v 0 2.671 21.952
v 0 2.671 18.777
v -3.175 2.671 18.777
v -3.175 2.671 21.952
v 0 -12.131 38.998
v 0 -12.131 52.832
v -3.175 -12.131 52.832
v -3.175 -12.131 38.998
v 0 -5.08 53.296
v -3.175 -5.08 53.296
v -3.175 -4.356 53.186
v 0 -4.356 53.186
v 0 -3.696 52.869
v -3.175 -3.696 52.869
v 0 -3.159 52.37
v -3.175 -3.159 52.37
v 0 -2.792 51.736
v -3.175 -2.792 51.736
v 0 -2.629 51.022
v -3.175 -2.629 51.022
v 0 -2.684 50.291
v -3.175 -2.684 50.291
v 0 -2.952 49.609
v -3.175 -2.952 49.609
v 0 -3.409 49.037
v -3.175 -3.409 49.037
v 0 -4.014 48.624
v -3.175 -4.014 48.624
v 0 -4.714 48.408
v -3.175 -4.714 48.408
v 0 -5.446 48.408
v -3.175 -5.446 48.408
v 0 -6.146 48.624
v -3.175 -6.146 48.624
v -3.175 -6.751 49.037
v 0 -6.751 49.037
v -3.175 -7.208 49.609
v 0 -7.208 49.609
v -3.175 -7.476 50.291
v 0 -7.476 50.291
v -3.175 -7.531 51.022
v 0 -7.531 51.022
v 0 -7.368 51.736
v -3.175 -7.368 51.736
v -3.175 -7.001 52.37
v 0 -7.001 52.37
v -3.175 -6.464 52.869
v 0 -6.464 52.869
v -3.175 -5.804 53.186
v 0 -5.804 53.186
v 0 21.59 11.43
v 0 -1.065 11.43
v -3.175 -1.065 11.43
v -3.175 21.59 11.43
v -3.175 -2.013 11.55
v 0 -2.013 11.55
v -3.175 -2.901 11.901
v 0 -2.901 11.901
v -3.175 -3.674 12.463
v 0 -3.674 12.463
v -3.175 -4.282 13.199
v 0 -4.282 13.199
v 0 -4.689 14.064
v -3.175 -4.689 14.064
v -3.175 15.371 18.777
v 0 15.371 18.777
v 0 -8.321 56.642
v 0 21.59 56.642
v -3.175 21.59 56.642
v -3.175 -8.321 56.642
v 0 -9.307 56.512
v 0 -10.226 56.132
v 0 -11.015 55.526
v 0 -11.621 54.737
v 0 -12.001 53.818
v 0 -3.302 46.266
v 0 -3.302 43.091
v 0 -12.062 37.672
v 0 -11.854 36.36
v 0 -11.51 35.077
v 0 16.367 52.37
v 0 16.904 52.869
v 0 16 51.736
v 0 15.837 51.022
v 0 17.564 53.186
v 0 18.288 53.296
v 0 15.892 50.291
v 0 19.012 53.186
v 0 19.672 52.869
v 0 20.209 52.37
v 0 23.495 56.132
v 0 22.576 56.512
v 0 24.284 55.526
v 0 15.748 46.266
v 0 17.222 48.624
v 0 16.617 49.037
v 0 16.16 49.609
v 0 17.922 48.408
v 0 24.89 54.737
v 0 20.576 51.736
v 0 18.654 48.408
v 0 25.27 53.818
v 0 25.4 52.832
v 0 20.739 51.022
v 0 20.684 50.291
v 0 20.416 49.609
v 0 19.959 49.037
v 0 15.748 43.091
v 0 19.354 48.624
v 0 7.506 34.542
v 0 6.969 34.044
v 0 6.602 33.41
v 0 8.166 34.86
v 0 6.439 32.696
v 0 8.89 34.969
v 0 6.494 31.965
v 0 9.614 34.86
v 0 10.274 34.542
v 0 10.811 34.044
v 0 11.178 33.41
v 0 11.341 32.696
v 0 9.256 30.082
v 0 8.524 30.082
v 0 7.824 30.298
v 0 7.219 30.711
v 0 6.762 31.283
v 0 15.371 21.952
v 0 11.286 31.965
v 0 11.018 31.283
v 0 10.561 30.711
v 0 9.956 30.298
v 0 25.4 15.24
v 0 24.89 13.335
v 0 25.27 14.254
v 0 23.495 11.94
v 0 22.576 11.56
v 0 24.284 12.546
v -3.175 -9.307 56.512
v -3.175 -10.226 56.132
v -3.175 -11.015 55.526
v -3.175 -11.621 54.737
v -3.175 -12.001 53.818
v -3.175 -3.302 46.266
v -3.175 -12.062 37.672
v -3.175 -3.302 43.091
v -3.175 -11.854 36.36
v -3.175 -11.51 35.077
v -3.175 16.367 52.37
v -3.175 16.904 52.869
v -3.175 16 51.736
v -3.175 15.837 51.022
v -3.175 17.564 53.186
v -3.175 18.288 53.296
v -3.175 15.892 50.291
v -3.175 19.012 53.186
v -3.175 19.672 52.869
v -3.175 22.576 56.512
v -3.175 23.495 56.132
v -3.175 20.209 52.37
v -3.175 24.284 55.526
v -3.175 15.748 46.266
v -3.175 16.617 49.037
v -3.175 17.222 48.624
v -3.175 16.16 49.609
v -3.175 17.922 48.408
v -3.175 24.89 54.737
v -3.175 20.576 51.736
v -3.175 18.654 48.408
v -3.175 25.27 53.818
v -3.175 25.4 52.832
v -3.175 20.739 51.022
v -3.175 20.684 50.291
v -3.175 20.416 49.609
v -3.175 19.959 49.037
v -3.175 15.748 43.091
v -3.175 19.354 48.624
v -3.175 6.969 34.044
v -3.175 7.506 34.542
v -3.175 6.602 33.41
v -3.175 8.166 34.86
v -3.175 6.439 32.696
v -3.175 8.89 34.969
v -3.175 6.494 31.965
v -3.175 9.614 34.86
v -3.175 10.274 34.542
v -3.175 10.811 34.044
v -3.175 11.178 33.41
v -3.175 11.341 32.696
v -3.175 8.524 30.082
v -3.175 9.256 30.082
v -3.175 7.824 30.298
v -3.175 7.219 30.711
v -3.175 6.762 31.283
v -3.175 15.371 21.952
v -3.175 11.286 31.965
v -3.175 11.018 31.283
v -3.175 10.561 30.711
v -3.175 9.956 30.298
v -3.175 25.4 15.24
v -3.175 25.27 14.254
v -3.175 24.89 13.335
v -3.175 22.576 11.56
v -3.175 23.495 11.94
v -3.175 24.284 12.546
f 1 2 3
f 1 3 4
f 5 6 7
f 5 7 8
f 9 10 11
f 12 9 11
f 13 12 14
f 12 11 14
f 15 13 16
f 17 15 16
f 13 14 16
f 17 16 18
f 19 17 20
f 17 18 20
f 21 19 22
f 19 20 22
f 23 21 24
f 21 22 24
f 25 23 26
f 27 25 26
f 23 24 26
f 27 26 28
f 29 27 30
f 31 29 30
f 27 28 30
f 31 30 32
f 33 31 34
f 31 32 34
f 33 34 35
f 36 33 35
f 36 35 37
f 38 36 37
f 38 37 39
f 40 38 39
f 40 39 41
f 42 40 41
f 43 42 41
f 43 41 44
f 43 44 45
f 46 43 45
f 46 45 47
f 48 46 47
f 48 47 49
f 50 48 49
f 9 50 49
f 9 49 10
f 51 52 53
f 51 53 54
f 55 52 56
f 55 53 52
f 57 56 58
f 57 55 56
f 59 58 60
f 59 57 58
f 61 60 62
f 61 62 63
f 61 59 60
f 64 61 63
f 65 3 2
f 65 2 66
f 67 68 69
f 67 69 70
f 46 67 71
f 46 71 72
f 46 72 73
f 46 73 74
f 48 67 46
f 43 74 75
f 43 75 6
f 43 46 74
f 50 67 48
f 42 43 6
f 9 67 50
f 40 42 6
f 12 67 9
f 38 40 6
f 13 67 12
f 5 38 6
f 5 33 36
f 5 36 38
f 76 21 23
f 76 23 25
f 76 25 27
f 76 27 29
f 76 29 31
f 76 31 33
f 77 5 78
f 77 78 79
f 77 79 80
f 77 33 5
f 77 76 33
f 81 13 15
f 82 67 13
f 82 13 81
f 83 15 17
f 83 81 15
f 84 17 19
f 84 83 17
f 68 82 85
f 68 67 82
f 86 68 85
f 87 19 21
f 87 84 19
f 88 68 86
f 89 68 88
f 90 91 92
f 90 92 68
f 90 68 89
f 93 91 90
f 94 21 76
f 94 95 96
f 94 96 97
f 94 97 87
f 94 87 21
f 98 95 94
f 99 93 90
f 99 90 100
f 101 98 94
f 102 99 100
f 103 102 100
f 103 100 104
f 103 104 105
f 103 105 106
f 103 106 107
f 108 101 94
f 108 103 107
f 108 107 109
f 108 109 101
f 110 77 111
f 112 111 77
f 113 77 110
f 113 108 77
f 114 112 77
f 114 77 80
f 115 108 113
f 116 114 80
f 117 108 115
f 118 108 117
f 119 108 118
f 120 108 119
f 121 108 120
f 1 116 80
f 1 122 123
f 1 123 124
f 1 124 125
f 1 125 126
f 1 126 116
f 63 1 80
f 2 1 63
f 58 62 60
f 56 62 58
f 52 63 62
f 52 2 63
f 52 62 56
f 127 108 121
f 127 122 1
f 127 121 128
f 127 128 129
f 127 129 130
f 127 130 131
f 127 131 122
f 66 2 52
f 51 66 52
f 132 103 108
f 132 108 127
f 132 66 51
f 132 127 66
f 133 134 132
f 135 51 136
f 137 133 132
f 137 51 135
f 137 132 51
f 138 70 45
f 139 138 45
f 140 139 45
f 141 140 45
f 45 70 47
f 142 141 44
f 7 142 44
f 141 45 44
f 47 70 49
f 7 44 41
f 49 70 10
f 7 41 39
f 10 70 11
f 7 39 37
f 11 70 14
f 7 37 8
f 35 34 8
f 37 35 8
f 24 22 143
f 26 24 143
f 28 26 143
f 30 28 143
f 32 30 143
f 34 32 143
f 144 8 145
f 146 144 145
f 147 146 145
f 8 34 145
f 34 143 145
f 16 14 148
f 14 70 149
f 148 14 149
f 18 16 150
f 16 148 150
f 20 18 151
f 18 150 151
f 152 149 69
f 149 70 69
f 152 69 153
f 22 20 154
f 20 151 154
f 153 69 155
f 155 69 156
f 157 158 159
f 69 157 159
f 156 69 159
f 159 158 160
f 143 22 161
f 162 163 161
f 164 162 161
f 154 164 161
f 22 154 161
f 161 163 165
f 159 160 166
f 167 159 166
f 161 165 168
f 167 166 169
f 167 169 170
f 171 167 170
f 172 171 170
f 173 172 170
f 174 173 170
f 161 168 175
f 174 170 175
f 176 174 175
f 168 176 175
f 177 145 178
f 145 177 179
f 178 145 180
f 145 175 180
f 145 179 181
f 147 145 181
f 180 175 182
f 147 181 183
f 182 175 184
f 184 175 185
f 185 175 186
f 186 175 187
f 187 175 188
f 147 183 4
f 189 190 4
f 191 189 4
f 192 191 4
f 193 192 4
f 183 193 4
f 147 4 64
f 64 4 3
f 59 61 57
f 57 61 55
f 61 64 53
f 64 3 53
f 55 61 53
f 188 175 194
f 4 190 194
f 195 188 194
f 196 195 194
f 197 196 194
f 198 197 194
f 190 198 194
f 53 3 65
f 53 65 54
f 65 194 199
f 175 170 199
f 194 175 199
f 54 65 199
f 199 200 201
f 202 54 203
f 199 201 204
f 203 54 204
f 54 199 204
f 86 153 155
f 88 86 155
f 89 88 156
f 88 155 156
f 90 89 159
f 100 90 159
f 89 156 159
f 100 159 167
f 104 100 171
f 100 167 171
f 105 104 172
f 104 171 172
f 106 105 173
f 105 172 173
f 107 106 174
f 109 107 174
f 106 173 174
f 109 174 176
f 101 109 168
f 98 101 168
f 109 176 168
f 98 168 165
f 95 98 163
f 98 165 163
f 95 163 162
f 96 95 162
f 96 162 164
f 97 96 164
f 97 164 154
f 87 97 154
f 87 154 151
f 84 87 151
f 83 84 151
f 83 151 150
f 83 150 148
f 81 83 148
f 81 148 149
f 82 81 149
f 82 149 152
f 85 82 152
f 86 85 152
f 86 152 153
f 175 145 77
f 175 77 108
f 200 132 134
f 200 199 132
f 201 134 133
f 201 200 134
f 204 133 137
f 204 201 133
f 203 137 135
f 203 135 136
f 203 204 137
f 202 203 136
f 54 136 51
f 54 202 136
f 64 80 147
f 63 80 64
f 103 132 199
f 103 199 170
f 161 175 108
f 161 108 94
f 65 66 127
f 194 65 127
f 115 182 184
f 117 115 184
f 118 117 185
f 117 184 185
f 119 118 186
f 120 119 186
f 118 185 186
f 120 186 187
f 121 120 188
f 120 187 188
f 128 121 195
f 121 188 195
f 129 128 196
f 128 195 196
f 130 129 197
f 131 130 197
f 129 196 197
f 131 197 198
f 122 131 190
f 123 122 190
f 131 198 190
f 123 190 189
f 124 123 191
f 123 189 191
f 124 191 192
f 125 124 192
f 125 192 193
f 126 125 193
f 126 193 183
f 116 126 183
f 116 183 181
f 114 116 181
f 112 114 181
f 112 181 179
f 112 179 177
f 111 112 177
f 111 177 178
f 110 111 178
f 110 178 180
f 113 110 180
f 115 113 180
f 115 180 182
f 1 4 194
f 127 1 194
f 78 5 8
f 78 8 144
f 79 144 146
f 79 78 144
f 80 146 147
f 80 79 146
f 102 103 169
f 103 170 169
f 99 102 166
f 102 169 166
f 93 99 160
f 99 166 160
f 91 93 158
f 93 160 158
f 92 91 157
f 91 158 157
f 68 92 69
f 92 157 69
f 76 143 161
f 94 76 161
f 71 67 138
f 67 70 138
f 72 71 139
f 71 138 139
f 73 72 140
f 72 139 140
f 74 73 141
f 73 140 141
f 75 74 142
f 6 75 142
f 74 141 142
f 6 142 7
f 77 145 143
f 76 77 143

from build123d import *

# Parameters (mm, degrees)
BOSS_EXTRUDE1_DEPTH              = 3.175
F_10_0_1935_DIAMETER_HOLE1_D     = 4.9149
F_10_0_1935_DIAMETER_HOLE1_DEPTH = 11.176
F_10_0_1935_DIAMETER_HOLE1_TIP   = 1.476584928
SKETCH6_W                        = 3.175
SKETCH6_H                        = 19.05
SKETCH6_H_2                      = 12.7
CUT_EXTRUDE1_DEPTH               = 63.157515949
FILLET1_R                        = 3.81


with BuildPart() as part:
    # Sketch1 → Boss-Extrude1 (new body)
    with BuildSketch(Plane(origin=(0, 0, 0), x_dir=(0, 0, -1), z_dir=(1, 0, 0))):
        with BuildLine():
            Line((-11.43, 25.4), (-56.642, 25.4))
            Line((-56.642, 25.4), (-56.642, -12.13104))
            Line((-56.642, -12.13104), (-39.203469383, -12.13104))
            Line((-39.203469383, -12.13104), (-38.998073701, -12.13104))
            ThreePointArc((-38.998073701, -12.13104), (-37.012948259, -11.974934012), (-35.076624386, -11.510453697))
            Line((-35.076624386, -11.510453697), (-11.43, -3.833836163))
            Line((-11.43, -3.833836163), (-11.43, 25.4))
        make_face()
    extrude(amount=-BOSS_EXTRUDE1_DEPTH)

    # #10 (0.1935) Diameter Hole1
    with Locations(Plane(origin=(0, 0, 0), x_dir=(0, 0, -1), z_dir=(1, 0, 0))):
        with Locations((-50.8381, -5.08), (-50.8381, 18.288), (-32.512, 8.89)):
            Hole(F_10_0_1935_DIAMETER_HOLE1_D / 2, depth=F_10_0_1935_DIAMETER_HOLE1_DEPTH)
            with Locations((0, 0, -(F_10_0_1935_DIAMETER_HOLE1_DEPTH + F_10_0_1935_DIAMETER_HOLE1_TIP / 2))):  # 118° drill point
                Cone(0, F_10_0_1935_DIAMETER_HOLE1_D / 2, F_10_0_1935_DIAMETER_HOLE1_TIP, mode=Mode.SUBTRACT)

    # Sketch6 → Cut-Extrude1 (cut, through all)
    with BuildSketch(Plane.ZY.offset(3.175)):
        with Locations((44.6786, 6.223)):
            Rectangle(SKETCH6_W, SKETCH6_H)
        with Locations((20.364644497, 9.020993871)):
            Rectangle(SKETCH6_W, SKETCH6_H_2)
    extrude(amount=-CUT_EXTRUDE1_DEPTH, mode=Mode.SUBTRACT)

    # Fillet1
    fillet1_edges = [part.edges().sort_by_distance(p)[0] for p in [
        (-1.5875, -12.13104, 56.642),
        (-1.5875, 25.4, 56.642),
        (-1.5875, 25.4, 11.43),
        (-1.5875, -3.833836163, 11.43),
    ]]
    fillet(fillet1_edges, radius=FILLET1_R)


solid = part.part
